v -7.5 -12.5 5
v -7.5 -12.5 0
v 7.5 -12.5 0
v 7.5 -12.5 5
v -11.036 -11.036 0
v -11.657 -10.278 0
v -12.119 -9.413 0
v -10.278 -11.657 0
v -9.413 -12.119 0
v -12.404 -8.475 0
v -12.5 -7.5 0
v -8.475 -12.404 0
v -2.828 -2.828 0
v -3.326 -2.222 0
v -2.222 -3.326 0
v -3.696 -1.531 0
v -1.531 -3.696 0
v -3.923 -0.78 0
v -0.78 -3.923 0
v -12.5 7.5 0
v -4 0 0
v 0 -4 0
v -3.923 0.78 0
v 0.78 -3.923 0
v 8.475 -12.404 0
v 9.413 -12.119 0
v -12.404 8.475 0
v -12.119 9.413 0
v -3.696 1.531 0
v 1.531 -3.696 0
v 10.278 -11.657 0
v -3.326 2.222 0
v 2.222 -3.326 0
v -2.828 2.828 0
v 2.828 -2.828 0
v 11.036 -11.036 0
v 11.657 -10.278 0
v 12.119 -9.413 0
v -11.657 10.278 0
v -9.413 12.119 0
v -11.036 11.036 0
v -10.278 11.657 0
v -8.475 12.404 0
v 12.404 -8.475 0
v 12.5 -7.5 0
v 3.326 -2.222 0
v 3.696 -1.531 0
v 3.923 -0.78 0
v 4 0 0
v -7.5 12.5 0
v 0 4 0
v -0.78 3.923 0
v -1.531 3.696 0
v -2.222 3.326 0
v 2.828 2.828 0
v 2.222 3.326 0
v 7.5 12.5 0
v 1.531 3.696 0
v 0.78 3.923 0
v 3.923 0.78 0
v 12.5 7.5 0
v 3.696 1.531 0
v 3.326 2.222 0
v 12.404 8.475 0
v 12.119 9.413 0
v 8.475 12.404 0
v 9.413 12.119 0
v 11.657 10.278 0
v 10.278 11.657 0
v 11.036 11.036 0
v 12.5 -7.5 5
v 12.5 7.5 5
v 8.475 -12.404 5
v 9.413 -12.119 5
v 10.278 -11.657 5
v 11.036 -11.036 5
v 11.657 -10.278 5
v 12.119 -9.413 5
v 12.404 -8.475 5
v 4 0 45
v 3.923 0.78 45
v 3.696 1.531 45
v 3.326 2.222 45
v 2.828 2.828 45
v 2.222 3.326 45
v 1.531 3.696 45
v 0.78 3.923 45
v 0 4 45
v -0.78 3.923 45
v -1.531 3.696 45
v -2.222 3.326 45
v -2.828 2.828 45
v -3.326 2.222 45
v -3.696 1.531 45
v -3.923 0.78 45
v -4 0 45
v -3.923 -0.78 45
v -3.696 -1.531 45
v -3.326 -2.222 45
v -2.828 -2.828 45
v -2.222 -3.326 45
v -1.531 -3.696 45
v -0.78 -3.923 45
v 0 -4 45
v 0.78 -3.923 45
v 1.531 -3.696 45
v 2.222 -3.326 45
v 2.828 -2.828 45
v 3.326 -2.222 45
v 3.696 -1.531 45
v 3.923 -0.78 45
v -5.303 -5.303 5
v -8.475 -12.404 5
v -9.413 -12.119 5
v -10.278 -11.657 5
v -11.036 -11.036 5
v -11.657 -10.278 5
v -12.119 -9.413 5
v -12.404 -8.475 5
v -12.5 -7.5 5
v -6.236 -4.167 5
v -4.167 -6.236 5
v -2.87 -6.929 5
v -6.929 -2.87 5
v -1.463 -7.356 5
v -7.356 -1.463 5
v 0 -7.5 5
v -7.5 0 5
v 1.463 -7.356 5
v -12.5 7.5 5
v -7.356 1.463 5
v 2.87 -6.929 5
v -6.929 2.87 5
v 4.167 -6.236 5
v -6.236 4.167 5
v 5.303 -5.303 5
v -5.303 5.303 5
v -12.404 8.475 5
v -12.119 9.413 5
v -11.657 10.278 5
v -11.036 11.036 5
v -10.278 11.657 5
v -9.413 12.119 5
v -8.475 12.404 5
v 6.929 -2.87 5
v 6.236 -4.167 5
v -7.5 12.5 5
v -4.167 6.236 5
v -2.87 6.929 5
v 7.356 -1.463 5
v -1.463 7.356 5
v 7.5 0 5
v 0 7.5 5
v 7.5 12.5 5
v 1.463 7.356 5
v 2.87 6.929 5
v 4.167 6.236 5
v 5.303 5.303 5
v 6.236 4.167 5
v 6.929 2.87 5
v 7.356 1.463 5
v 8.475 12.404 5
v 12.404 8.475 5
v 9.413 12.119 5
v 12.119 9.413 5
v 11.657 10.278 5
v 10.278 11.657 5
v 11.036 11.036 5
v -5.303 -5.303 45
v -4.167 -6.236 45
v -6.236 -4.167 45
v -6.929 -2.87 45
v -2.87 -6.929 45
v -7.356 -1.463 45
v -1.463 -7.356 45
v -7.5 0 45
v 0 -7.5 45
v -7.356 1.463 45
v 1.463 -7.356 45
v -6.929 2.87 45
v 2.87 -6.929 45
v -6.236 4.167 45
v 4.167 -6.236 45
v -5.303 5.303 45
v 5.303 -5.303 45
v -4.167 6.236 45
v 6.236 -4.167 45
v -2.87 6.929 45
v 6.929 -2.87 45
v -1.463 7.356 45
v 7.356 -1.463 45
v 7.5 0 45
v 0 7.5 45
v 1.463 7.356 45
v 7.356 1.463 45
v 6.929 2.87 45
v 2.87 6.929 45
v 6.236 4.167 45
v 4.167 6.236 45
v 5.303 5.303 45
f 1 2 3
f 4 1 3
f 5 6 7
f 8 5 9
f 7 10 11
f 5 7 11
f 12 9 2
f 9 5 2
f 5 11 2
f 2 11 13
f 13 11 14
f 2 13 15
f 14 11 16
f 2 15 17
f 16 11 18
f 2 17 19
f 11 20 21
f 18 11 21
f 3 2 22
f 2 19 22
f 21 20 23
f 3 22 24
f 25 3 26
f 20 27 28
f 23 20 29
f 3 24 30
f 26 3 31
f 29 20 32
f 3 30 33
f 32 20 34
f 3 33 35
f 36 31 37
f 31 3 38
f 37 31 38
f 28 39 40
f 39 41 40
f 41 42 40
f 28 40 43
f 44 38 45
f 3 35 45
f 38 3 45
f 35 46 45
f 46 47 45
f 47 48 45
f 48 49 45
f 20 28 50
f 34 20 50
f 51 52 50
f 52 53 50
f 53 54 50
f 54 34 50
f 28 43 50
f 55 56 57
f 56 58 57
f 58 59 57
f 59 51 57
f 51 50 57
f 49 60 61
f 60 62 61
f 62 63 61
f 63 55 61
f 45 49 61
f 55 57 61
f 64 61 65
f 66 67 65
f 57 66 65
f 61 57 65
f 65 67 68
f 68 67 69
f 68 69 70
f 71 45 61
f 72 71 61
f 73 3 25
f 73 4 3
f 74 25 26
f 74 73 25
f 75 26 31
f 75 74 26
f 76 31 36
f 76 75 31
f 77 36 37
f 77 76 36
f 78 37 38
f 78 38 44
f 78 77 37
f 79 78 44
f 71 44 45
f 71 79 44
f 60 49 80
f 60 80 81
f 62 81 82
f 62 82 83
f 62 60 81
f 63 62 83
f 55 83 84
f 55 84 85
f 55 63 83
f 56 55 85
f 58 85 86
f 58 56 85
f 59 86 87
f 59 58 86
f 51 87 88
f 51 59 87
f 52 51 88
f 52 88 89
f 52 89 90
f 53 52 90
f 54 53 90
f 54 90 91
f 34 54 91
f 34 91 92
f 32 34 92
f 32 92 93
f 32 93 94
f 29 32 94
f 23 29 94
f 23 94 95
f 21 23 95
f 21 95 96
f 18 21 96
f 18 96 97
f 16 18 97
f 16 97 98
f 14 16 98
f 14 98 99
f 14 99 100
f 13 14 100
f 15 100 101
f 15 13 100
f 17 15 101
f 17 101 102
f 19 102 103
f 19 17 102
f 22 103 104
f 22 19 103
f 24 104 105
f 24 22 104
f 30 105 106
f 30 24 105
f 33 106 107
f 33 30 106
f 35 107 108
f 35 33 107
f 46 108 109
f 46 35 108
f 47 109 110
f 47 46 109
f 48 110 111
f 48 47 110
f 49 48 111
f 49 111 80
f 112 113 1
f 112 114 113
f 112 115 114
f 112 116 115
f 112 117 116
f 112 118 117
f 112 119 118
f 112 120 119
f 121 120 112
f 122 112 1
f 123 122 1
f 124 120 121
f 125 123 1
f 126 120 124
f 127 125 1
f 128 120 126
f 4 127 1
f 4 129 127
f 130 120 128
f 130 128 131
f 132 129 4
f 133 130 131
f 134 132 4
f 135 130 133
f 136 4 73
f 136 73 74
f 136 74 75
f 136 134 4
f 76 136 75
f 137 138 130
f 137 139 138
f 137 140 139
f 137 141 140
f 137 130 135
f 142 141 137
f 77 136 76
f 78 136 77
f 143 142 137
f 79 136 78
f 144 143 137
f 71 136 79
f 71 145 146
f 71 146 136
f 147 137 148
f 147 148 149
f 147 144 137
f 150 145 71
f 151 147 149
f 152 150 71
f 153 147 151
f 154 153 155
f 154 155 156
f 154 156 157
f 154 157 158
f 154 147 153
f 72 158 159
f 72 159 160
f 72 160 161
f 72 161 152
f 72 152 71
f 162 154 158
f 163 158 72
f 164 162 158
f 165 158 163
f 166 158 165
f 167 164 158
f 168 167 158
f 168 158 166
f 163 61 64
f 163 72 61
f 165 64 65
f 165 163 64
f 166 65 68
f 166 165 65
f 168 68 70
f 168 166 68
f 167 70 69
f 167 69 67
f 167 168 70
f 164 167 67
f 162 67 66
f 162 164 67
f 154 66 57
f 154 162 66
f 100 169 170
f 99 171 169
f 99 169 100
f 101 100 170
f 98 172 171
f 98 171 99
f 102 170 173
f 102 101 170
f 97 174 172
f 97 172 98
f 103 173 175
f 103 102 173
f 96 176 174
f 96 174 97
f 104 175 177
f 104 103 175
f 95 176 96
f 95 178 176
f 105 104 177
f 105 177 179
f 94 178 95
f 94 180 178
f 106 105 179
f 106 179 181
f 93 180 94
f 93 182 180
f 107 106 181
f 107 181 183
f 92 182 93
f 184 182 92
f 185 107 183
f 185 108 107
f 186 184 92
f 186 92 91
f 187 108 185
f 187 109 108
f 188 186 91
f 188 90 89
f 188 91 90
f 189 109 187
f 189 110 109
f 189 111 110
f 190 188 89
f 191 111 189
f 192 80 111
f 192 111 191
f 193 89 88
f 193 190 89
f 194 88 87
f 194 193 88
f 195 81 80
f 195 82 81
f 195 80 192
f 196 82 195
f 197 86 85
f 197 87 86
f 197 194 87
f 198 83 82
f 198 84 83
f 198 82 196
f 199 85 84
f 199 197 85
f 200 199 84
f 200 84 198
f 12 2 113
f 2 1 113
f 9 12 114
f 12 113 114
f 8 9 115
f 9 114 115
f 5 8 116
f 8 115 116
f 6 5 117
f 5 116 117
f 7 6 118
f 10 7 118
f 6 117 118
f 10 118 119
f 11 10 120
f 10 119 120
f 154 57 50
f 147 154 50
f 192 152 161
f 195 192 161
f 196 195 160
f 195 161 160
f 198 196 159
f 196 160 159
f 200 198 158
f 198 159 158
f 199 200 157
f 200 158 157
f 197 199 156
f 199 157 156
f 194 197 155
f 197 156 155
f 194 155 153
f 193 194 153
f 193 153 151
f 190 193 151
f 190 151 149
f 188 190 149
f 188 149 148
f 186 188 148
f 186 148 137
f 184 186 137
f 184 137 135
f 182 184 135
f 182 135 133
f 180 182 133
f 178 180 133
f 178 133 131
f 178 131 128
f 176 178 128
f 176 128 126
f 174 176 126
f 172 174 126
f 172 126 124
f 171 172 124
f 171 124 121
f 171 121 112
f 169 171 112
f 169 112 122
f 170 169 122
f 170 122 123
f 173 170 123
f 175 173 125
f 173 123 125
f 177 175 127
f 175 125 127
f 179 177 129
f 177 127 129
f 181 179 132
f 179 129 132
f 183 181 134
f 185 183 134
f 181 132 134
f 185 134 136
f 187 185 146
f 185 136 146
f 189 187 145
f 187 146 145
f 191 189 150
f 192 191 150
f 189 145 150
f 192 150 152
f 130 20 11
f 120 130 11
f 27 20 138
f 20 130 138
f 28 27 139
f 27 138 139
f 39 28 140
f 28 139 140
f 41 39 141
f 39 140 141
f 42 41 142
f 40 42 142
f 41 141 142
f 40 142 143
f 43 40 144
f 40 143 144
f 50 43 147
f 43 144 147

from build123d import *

# Parameters (mm, degrees)
F2_DEPTH = 5
F0_R     = 7.5
F0_R_2   = 4
F3_DEPTH = 45
F4_R     = 5
F5_DEPTH = 45


with BuildPart() as f2:
    # F1 (on Top) → F2 (new body)
    with BuildSketch(Plane.XY):
        Polygon((-12.5, -12.5), (0, -12.5), (12.5, -12.5), (12.5, 12.5), (-12.5, 12.5), align=None)
    extrude(amount=F2_DEPTH)

    # F0 (on Top) → F3 (join)
    with BuildSketch(Plane.XY):
        Circle(F0_R)
        Circle(F0_R_2, mode=Mode.SUBTRACT)
    extrude(amount=F3_DEPTH)

    # F4
    f4_edges = [f2.edges().sort_by_distance(p)[0] for p in [
        (12.5, 12.5, 2.5),
        (-12.5, 12.5, 2.5),
        (12.5, -12.5, 2.5),
        (-12.5, -12.5, 2.5),
    ]]
    fillet(f4_edges, radius=F4_R)

    # F0 (on Top) → F5 (cut)
    with BuildSketch(Plane.XY):
        Circle(F0_R_2)
    extrude(amount=F5_DEPTH, mode=Mode.SUBTRACT)


solid = f2.part
